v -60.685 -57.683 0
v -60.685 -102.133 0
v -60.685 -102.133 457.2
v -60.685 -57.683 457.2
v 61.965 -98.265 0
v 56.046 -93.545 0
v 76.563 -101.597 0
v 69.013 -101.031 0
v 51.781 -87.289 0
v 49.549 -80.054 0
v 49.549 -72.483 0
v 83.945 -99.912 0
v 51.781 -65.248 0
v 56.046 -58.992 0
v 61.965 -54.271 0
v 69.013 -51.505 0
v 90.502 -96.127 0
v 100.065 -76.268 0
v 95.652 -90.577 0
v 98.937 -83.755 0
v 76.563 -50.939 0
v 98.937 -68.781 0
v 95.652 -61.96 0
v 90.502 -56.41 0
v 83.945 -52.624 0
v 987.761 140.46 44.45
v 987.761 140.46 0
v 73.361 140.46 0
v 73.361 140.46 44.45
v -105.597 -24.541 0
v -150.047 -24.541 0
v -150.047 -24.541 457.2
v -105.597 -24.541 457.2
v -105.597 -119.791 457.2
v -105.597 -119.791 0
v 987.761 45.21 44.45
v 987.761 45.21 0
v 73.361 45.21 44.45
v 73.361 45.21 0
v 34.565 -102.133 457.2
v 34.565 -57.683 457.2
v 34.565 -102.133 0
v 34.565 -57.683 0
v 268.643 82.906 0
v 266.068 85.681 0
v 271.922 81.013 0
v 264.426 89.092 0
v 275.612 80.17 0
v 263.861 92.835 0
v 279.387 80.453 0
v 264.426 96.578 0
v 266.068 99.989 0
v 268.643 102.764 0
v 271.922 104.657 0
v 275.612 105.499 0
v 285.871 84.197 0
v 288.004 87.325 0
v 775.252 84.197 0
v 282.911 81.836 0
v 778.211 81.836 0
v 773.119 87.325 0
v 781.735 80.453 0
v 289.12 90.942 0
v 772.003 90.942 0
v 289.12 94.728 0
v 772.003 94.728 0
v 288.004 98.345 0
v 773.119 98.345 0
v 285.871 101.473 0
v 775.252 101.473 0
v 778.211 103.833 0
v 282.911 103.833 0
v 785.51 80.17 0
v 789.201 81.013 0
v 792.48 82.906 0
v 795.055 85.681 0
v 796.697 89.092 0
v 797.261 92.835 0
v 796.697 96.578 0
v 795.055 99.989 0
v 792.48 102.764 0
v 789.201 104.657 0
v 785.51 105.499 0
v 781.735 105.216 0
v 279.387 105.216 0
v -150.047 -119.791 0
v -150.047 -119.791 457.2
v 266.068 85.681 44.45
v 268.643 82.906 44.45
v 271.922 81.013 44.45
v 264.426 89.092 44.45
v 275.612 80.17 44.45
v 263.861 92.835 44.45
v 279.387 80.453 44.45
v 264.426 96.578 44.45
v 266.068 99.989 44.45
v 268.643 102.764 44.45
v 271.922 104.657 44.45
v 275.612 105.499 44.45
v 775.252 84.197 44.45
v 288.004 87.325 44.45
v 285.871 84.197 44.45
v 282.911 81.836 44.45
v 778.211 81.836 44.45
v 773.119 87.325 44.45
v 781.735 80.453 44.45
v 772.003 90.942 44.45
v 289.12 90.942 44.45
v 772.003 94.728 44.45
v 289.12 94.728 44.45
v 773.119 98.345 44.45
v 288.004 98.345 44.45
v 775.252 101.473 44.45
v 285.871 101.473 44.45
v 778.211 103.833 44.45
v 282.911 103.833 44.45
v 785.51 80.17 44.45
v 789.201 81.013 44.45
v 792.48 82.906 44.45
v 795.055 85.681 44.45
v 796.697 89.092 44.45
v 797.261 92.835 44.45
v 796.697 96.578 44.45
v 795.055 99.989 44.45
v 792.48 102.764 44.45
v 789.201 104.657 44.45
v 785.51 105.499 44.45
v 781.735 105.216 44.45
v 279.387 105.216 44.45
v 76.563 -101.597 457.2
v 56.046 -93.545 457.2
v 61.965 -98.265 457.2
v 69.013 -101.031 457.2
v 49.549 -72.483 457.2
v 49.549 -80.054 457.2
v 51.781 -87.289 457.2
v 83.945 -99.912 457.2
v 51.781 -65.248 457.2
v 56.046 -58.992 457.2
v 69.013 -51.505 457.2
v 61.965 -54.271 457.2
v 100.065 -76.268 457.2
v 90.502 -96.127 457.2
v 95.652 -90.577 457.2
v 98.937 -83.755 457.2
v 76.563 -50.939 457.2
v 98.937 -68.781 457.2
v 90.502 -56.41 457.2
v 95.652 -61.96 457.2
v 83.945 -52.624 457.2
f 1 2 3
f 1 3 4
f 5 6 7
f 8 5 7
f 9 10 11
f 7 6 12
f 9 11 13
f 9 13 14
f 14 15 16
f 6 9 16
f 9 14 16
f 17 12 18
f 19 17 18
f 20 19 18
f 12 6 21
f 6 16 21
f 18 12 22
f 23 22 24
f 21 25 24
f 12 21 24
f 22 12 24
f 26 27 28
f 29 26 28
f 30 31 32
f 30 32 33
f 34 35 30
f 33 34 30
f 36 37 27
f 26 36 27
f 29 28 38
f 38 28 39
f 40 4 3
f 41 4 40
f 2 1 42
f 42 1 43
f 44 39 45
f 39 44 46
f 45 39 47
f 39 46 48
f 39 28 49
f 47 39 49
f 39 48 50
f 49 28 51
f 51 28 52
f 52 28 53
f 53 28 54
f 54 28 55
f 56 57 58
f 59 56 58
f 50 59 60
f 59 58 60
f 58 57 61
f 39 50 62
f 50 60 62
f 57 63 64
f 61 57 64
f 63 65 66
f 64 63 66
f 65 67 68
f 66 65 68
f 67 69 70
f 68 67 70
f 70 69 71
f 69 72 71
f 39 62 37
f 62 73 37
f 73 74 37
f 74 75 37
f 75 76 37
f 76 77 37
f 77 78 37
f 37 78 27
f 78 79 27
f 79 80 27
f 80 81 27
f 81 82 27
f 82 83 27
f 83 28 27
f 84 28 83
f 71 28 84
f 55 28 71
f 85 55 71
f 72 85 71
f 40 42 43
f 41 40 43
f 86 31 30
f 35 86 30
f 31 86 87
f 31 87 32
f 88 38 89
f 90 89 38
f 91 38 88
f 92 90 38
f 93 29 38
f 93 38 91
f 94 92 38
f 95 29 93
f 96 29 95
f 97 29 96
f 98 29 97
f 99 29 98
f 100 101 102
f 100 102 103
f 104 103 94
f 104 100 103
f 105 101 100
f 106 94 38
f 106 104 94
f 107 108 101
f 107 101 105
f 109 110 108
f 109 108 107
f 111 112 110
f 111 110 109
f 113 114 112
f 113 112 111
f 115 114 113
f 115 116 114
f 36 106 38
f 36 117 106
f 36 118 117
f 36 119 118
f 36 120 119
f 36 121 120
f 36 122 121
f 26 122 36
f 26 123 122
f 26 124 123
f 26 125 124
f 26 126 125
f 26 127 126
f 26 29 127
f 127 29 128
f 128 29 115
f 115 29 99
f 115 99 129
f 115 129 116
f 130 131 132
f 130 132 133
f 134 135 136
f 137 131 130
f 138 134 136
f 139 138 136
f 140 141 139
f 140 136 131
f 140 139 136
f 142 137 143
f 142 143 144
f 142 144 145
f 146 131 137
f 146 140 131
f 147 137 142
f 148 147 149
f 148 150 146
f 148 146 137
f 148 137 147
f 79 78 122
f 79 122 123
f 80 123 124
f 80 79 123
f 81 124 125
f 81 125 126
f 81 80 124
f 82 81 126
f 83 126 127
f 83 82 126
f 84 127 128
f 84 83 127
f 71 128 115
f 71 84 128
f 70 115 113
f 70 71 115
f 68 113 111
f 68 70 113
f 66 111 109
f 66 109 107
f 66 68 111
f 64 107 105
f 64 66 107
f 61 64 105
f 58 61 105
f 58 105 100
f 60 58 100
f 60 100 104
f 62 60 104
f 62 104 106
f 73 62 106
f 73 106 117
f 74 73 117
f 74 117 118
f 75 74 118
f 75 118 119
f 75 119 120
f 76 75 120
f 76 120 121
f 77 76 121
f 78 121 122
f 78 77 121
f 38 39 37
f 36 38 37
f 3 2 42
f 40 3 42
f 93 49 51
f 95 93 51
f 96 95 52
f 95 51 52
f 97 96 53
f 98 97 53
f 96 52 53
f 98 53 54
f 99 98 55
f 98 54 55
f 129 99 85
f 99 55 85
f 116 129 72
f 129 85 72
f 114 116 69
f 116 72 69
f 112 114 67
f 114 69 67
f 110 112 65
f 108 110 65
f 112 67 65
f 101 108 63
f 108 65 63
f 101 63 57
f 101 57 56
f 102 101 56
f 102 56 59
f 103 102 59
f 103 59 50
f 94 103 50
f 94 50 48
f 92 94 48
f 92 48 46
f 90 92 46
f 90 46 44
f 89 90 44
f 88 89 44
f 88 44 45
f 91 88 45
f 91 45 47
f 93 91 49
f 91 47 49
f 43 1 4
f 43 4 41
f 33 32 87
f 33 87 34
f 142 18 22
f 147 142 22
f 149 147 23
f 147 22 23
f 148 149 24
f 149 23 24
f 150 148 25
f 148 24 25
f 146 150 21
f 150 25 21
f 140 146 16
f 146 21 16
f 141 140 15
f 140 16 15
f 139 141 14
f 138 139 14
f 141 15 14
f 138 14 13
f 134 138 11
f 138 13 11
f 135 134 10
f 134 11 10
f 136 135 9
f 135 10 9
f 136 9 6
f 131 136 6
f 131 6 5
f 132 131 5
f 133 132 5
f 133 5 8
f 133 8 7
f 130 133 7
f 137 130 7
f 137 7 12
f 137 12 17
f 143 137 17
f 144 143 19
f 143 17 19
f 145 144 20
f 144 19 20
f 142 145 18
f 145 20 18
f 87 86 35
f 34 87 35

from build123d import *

# Parameters (mm, degrees)
F0_R     = 12.7
F1_DEPTH = 44.45
F2_W     = 95.25
F2_H     = 44.45
F3_DEPTH = 457.2
F4_W     = 44.45
F4_H     = 95.25
F5_DEPTH = 457.2
F6_R     = 25.4
F7_DEPTH = 457.2


with BuildPart() as f1:
    # F0 (on Top) → F1 (new body)
    with BuildSketch(Plane.XY):
        Polygon((987.761351, 140.459903), (73.361351, 140.459903), (73.361351, 92.834903), (73.361351, 45.209903), (987.761351, 45.209903), (987.761351, 92.834903), align=None)
        with BuildLine():
            ThreePointArc((289.261351, 92.834903), (276.561351, 80.134903), (263.861351, 92.834903))
            ThreePointArc((263.861351, 92.834903), (276.561351, 105.534903), (289.261351, 92.834903))
        make_face(mode=Mode.SUBTRACT)
        with Locations((784.561351, 92.834903)):
            Circle(F0_R, mode=Mode.SUBTRACT)
    extrude(amount=F1_DEPTH)


with BuildPart() as f3:
    # F2 (on Top) → F3 (new body)
    with BuildSketch(Plane.XY):
        with Locations((-13.060169, -79.907818)):
            Rectangle(F2_W, F2_H)
    extrude(amount=F3_DEPTH)


with BuildPart() as f5:
    # F4 (on Top) → F5 (new body)
    with BuildSketch(Plane.XY):
        with Locations((-127.822479, -72.166136)):
            Rectangle(F4_W, F4_H)
    extrude(amount=F5_DEPTH)


with BuildPart() as f7:
    # F6 (on Top) → F7 (new body)
    with BuildSketch(Plane.XY):
        with Locations((74.665189, -76.268211)):
            Circle(F6_R)
    extrude(amount=F7_DEPTH)


solid = Compound([f1.part, f3.part, f5.part, f7.part])
